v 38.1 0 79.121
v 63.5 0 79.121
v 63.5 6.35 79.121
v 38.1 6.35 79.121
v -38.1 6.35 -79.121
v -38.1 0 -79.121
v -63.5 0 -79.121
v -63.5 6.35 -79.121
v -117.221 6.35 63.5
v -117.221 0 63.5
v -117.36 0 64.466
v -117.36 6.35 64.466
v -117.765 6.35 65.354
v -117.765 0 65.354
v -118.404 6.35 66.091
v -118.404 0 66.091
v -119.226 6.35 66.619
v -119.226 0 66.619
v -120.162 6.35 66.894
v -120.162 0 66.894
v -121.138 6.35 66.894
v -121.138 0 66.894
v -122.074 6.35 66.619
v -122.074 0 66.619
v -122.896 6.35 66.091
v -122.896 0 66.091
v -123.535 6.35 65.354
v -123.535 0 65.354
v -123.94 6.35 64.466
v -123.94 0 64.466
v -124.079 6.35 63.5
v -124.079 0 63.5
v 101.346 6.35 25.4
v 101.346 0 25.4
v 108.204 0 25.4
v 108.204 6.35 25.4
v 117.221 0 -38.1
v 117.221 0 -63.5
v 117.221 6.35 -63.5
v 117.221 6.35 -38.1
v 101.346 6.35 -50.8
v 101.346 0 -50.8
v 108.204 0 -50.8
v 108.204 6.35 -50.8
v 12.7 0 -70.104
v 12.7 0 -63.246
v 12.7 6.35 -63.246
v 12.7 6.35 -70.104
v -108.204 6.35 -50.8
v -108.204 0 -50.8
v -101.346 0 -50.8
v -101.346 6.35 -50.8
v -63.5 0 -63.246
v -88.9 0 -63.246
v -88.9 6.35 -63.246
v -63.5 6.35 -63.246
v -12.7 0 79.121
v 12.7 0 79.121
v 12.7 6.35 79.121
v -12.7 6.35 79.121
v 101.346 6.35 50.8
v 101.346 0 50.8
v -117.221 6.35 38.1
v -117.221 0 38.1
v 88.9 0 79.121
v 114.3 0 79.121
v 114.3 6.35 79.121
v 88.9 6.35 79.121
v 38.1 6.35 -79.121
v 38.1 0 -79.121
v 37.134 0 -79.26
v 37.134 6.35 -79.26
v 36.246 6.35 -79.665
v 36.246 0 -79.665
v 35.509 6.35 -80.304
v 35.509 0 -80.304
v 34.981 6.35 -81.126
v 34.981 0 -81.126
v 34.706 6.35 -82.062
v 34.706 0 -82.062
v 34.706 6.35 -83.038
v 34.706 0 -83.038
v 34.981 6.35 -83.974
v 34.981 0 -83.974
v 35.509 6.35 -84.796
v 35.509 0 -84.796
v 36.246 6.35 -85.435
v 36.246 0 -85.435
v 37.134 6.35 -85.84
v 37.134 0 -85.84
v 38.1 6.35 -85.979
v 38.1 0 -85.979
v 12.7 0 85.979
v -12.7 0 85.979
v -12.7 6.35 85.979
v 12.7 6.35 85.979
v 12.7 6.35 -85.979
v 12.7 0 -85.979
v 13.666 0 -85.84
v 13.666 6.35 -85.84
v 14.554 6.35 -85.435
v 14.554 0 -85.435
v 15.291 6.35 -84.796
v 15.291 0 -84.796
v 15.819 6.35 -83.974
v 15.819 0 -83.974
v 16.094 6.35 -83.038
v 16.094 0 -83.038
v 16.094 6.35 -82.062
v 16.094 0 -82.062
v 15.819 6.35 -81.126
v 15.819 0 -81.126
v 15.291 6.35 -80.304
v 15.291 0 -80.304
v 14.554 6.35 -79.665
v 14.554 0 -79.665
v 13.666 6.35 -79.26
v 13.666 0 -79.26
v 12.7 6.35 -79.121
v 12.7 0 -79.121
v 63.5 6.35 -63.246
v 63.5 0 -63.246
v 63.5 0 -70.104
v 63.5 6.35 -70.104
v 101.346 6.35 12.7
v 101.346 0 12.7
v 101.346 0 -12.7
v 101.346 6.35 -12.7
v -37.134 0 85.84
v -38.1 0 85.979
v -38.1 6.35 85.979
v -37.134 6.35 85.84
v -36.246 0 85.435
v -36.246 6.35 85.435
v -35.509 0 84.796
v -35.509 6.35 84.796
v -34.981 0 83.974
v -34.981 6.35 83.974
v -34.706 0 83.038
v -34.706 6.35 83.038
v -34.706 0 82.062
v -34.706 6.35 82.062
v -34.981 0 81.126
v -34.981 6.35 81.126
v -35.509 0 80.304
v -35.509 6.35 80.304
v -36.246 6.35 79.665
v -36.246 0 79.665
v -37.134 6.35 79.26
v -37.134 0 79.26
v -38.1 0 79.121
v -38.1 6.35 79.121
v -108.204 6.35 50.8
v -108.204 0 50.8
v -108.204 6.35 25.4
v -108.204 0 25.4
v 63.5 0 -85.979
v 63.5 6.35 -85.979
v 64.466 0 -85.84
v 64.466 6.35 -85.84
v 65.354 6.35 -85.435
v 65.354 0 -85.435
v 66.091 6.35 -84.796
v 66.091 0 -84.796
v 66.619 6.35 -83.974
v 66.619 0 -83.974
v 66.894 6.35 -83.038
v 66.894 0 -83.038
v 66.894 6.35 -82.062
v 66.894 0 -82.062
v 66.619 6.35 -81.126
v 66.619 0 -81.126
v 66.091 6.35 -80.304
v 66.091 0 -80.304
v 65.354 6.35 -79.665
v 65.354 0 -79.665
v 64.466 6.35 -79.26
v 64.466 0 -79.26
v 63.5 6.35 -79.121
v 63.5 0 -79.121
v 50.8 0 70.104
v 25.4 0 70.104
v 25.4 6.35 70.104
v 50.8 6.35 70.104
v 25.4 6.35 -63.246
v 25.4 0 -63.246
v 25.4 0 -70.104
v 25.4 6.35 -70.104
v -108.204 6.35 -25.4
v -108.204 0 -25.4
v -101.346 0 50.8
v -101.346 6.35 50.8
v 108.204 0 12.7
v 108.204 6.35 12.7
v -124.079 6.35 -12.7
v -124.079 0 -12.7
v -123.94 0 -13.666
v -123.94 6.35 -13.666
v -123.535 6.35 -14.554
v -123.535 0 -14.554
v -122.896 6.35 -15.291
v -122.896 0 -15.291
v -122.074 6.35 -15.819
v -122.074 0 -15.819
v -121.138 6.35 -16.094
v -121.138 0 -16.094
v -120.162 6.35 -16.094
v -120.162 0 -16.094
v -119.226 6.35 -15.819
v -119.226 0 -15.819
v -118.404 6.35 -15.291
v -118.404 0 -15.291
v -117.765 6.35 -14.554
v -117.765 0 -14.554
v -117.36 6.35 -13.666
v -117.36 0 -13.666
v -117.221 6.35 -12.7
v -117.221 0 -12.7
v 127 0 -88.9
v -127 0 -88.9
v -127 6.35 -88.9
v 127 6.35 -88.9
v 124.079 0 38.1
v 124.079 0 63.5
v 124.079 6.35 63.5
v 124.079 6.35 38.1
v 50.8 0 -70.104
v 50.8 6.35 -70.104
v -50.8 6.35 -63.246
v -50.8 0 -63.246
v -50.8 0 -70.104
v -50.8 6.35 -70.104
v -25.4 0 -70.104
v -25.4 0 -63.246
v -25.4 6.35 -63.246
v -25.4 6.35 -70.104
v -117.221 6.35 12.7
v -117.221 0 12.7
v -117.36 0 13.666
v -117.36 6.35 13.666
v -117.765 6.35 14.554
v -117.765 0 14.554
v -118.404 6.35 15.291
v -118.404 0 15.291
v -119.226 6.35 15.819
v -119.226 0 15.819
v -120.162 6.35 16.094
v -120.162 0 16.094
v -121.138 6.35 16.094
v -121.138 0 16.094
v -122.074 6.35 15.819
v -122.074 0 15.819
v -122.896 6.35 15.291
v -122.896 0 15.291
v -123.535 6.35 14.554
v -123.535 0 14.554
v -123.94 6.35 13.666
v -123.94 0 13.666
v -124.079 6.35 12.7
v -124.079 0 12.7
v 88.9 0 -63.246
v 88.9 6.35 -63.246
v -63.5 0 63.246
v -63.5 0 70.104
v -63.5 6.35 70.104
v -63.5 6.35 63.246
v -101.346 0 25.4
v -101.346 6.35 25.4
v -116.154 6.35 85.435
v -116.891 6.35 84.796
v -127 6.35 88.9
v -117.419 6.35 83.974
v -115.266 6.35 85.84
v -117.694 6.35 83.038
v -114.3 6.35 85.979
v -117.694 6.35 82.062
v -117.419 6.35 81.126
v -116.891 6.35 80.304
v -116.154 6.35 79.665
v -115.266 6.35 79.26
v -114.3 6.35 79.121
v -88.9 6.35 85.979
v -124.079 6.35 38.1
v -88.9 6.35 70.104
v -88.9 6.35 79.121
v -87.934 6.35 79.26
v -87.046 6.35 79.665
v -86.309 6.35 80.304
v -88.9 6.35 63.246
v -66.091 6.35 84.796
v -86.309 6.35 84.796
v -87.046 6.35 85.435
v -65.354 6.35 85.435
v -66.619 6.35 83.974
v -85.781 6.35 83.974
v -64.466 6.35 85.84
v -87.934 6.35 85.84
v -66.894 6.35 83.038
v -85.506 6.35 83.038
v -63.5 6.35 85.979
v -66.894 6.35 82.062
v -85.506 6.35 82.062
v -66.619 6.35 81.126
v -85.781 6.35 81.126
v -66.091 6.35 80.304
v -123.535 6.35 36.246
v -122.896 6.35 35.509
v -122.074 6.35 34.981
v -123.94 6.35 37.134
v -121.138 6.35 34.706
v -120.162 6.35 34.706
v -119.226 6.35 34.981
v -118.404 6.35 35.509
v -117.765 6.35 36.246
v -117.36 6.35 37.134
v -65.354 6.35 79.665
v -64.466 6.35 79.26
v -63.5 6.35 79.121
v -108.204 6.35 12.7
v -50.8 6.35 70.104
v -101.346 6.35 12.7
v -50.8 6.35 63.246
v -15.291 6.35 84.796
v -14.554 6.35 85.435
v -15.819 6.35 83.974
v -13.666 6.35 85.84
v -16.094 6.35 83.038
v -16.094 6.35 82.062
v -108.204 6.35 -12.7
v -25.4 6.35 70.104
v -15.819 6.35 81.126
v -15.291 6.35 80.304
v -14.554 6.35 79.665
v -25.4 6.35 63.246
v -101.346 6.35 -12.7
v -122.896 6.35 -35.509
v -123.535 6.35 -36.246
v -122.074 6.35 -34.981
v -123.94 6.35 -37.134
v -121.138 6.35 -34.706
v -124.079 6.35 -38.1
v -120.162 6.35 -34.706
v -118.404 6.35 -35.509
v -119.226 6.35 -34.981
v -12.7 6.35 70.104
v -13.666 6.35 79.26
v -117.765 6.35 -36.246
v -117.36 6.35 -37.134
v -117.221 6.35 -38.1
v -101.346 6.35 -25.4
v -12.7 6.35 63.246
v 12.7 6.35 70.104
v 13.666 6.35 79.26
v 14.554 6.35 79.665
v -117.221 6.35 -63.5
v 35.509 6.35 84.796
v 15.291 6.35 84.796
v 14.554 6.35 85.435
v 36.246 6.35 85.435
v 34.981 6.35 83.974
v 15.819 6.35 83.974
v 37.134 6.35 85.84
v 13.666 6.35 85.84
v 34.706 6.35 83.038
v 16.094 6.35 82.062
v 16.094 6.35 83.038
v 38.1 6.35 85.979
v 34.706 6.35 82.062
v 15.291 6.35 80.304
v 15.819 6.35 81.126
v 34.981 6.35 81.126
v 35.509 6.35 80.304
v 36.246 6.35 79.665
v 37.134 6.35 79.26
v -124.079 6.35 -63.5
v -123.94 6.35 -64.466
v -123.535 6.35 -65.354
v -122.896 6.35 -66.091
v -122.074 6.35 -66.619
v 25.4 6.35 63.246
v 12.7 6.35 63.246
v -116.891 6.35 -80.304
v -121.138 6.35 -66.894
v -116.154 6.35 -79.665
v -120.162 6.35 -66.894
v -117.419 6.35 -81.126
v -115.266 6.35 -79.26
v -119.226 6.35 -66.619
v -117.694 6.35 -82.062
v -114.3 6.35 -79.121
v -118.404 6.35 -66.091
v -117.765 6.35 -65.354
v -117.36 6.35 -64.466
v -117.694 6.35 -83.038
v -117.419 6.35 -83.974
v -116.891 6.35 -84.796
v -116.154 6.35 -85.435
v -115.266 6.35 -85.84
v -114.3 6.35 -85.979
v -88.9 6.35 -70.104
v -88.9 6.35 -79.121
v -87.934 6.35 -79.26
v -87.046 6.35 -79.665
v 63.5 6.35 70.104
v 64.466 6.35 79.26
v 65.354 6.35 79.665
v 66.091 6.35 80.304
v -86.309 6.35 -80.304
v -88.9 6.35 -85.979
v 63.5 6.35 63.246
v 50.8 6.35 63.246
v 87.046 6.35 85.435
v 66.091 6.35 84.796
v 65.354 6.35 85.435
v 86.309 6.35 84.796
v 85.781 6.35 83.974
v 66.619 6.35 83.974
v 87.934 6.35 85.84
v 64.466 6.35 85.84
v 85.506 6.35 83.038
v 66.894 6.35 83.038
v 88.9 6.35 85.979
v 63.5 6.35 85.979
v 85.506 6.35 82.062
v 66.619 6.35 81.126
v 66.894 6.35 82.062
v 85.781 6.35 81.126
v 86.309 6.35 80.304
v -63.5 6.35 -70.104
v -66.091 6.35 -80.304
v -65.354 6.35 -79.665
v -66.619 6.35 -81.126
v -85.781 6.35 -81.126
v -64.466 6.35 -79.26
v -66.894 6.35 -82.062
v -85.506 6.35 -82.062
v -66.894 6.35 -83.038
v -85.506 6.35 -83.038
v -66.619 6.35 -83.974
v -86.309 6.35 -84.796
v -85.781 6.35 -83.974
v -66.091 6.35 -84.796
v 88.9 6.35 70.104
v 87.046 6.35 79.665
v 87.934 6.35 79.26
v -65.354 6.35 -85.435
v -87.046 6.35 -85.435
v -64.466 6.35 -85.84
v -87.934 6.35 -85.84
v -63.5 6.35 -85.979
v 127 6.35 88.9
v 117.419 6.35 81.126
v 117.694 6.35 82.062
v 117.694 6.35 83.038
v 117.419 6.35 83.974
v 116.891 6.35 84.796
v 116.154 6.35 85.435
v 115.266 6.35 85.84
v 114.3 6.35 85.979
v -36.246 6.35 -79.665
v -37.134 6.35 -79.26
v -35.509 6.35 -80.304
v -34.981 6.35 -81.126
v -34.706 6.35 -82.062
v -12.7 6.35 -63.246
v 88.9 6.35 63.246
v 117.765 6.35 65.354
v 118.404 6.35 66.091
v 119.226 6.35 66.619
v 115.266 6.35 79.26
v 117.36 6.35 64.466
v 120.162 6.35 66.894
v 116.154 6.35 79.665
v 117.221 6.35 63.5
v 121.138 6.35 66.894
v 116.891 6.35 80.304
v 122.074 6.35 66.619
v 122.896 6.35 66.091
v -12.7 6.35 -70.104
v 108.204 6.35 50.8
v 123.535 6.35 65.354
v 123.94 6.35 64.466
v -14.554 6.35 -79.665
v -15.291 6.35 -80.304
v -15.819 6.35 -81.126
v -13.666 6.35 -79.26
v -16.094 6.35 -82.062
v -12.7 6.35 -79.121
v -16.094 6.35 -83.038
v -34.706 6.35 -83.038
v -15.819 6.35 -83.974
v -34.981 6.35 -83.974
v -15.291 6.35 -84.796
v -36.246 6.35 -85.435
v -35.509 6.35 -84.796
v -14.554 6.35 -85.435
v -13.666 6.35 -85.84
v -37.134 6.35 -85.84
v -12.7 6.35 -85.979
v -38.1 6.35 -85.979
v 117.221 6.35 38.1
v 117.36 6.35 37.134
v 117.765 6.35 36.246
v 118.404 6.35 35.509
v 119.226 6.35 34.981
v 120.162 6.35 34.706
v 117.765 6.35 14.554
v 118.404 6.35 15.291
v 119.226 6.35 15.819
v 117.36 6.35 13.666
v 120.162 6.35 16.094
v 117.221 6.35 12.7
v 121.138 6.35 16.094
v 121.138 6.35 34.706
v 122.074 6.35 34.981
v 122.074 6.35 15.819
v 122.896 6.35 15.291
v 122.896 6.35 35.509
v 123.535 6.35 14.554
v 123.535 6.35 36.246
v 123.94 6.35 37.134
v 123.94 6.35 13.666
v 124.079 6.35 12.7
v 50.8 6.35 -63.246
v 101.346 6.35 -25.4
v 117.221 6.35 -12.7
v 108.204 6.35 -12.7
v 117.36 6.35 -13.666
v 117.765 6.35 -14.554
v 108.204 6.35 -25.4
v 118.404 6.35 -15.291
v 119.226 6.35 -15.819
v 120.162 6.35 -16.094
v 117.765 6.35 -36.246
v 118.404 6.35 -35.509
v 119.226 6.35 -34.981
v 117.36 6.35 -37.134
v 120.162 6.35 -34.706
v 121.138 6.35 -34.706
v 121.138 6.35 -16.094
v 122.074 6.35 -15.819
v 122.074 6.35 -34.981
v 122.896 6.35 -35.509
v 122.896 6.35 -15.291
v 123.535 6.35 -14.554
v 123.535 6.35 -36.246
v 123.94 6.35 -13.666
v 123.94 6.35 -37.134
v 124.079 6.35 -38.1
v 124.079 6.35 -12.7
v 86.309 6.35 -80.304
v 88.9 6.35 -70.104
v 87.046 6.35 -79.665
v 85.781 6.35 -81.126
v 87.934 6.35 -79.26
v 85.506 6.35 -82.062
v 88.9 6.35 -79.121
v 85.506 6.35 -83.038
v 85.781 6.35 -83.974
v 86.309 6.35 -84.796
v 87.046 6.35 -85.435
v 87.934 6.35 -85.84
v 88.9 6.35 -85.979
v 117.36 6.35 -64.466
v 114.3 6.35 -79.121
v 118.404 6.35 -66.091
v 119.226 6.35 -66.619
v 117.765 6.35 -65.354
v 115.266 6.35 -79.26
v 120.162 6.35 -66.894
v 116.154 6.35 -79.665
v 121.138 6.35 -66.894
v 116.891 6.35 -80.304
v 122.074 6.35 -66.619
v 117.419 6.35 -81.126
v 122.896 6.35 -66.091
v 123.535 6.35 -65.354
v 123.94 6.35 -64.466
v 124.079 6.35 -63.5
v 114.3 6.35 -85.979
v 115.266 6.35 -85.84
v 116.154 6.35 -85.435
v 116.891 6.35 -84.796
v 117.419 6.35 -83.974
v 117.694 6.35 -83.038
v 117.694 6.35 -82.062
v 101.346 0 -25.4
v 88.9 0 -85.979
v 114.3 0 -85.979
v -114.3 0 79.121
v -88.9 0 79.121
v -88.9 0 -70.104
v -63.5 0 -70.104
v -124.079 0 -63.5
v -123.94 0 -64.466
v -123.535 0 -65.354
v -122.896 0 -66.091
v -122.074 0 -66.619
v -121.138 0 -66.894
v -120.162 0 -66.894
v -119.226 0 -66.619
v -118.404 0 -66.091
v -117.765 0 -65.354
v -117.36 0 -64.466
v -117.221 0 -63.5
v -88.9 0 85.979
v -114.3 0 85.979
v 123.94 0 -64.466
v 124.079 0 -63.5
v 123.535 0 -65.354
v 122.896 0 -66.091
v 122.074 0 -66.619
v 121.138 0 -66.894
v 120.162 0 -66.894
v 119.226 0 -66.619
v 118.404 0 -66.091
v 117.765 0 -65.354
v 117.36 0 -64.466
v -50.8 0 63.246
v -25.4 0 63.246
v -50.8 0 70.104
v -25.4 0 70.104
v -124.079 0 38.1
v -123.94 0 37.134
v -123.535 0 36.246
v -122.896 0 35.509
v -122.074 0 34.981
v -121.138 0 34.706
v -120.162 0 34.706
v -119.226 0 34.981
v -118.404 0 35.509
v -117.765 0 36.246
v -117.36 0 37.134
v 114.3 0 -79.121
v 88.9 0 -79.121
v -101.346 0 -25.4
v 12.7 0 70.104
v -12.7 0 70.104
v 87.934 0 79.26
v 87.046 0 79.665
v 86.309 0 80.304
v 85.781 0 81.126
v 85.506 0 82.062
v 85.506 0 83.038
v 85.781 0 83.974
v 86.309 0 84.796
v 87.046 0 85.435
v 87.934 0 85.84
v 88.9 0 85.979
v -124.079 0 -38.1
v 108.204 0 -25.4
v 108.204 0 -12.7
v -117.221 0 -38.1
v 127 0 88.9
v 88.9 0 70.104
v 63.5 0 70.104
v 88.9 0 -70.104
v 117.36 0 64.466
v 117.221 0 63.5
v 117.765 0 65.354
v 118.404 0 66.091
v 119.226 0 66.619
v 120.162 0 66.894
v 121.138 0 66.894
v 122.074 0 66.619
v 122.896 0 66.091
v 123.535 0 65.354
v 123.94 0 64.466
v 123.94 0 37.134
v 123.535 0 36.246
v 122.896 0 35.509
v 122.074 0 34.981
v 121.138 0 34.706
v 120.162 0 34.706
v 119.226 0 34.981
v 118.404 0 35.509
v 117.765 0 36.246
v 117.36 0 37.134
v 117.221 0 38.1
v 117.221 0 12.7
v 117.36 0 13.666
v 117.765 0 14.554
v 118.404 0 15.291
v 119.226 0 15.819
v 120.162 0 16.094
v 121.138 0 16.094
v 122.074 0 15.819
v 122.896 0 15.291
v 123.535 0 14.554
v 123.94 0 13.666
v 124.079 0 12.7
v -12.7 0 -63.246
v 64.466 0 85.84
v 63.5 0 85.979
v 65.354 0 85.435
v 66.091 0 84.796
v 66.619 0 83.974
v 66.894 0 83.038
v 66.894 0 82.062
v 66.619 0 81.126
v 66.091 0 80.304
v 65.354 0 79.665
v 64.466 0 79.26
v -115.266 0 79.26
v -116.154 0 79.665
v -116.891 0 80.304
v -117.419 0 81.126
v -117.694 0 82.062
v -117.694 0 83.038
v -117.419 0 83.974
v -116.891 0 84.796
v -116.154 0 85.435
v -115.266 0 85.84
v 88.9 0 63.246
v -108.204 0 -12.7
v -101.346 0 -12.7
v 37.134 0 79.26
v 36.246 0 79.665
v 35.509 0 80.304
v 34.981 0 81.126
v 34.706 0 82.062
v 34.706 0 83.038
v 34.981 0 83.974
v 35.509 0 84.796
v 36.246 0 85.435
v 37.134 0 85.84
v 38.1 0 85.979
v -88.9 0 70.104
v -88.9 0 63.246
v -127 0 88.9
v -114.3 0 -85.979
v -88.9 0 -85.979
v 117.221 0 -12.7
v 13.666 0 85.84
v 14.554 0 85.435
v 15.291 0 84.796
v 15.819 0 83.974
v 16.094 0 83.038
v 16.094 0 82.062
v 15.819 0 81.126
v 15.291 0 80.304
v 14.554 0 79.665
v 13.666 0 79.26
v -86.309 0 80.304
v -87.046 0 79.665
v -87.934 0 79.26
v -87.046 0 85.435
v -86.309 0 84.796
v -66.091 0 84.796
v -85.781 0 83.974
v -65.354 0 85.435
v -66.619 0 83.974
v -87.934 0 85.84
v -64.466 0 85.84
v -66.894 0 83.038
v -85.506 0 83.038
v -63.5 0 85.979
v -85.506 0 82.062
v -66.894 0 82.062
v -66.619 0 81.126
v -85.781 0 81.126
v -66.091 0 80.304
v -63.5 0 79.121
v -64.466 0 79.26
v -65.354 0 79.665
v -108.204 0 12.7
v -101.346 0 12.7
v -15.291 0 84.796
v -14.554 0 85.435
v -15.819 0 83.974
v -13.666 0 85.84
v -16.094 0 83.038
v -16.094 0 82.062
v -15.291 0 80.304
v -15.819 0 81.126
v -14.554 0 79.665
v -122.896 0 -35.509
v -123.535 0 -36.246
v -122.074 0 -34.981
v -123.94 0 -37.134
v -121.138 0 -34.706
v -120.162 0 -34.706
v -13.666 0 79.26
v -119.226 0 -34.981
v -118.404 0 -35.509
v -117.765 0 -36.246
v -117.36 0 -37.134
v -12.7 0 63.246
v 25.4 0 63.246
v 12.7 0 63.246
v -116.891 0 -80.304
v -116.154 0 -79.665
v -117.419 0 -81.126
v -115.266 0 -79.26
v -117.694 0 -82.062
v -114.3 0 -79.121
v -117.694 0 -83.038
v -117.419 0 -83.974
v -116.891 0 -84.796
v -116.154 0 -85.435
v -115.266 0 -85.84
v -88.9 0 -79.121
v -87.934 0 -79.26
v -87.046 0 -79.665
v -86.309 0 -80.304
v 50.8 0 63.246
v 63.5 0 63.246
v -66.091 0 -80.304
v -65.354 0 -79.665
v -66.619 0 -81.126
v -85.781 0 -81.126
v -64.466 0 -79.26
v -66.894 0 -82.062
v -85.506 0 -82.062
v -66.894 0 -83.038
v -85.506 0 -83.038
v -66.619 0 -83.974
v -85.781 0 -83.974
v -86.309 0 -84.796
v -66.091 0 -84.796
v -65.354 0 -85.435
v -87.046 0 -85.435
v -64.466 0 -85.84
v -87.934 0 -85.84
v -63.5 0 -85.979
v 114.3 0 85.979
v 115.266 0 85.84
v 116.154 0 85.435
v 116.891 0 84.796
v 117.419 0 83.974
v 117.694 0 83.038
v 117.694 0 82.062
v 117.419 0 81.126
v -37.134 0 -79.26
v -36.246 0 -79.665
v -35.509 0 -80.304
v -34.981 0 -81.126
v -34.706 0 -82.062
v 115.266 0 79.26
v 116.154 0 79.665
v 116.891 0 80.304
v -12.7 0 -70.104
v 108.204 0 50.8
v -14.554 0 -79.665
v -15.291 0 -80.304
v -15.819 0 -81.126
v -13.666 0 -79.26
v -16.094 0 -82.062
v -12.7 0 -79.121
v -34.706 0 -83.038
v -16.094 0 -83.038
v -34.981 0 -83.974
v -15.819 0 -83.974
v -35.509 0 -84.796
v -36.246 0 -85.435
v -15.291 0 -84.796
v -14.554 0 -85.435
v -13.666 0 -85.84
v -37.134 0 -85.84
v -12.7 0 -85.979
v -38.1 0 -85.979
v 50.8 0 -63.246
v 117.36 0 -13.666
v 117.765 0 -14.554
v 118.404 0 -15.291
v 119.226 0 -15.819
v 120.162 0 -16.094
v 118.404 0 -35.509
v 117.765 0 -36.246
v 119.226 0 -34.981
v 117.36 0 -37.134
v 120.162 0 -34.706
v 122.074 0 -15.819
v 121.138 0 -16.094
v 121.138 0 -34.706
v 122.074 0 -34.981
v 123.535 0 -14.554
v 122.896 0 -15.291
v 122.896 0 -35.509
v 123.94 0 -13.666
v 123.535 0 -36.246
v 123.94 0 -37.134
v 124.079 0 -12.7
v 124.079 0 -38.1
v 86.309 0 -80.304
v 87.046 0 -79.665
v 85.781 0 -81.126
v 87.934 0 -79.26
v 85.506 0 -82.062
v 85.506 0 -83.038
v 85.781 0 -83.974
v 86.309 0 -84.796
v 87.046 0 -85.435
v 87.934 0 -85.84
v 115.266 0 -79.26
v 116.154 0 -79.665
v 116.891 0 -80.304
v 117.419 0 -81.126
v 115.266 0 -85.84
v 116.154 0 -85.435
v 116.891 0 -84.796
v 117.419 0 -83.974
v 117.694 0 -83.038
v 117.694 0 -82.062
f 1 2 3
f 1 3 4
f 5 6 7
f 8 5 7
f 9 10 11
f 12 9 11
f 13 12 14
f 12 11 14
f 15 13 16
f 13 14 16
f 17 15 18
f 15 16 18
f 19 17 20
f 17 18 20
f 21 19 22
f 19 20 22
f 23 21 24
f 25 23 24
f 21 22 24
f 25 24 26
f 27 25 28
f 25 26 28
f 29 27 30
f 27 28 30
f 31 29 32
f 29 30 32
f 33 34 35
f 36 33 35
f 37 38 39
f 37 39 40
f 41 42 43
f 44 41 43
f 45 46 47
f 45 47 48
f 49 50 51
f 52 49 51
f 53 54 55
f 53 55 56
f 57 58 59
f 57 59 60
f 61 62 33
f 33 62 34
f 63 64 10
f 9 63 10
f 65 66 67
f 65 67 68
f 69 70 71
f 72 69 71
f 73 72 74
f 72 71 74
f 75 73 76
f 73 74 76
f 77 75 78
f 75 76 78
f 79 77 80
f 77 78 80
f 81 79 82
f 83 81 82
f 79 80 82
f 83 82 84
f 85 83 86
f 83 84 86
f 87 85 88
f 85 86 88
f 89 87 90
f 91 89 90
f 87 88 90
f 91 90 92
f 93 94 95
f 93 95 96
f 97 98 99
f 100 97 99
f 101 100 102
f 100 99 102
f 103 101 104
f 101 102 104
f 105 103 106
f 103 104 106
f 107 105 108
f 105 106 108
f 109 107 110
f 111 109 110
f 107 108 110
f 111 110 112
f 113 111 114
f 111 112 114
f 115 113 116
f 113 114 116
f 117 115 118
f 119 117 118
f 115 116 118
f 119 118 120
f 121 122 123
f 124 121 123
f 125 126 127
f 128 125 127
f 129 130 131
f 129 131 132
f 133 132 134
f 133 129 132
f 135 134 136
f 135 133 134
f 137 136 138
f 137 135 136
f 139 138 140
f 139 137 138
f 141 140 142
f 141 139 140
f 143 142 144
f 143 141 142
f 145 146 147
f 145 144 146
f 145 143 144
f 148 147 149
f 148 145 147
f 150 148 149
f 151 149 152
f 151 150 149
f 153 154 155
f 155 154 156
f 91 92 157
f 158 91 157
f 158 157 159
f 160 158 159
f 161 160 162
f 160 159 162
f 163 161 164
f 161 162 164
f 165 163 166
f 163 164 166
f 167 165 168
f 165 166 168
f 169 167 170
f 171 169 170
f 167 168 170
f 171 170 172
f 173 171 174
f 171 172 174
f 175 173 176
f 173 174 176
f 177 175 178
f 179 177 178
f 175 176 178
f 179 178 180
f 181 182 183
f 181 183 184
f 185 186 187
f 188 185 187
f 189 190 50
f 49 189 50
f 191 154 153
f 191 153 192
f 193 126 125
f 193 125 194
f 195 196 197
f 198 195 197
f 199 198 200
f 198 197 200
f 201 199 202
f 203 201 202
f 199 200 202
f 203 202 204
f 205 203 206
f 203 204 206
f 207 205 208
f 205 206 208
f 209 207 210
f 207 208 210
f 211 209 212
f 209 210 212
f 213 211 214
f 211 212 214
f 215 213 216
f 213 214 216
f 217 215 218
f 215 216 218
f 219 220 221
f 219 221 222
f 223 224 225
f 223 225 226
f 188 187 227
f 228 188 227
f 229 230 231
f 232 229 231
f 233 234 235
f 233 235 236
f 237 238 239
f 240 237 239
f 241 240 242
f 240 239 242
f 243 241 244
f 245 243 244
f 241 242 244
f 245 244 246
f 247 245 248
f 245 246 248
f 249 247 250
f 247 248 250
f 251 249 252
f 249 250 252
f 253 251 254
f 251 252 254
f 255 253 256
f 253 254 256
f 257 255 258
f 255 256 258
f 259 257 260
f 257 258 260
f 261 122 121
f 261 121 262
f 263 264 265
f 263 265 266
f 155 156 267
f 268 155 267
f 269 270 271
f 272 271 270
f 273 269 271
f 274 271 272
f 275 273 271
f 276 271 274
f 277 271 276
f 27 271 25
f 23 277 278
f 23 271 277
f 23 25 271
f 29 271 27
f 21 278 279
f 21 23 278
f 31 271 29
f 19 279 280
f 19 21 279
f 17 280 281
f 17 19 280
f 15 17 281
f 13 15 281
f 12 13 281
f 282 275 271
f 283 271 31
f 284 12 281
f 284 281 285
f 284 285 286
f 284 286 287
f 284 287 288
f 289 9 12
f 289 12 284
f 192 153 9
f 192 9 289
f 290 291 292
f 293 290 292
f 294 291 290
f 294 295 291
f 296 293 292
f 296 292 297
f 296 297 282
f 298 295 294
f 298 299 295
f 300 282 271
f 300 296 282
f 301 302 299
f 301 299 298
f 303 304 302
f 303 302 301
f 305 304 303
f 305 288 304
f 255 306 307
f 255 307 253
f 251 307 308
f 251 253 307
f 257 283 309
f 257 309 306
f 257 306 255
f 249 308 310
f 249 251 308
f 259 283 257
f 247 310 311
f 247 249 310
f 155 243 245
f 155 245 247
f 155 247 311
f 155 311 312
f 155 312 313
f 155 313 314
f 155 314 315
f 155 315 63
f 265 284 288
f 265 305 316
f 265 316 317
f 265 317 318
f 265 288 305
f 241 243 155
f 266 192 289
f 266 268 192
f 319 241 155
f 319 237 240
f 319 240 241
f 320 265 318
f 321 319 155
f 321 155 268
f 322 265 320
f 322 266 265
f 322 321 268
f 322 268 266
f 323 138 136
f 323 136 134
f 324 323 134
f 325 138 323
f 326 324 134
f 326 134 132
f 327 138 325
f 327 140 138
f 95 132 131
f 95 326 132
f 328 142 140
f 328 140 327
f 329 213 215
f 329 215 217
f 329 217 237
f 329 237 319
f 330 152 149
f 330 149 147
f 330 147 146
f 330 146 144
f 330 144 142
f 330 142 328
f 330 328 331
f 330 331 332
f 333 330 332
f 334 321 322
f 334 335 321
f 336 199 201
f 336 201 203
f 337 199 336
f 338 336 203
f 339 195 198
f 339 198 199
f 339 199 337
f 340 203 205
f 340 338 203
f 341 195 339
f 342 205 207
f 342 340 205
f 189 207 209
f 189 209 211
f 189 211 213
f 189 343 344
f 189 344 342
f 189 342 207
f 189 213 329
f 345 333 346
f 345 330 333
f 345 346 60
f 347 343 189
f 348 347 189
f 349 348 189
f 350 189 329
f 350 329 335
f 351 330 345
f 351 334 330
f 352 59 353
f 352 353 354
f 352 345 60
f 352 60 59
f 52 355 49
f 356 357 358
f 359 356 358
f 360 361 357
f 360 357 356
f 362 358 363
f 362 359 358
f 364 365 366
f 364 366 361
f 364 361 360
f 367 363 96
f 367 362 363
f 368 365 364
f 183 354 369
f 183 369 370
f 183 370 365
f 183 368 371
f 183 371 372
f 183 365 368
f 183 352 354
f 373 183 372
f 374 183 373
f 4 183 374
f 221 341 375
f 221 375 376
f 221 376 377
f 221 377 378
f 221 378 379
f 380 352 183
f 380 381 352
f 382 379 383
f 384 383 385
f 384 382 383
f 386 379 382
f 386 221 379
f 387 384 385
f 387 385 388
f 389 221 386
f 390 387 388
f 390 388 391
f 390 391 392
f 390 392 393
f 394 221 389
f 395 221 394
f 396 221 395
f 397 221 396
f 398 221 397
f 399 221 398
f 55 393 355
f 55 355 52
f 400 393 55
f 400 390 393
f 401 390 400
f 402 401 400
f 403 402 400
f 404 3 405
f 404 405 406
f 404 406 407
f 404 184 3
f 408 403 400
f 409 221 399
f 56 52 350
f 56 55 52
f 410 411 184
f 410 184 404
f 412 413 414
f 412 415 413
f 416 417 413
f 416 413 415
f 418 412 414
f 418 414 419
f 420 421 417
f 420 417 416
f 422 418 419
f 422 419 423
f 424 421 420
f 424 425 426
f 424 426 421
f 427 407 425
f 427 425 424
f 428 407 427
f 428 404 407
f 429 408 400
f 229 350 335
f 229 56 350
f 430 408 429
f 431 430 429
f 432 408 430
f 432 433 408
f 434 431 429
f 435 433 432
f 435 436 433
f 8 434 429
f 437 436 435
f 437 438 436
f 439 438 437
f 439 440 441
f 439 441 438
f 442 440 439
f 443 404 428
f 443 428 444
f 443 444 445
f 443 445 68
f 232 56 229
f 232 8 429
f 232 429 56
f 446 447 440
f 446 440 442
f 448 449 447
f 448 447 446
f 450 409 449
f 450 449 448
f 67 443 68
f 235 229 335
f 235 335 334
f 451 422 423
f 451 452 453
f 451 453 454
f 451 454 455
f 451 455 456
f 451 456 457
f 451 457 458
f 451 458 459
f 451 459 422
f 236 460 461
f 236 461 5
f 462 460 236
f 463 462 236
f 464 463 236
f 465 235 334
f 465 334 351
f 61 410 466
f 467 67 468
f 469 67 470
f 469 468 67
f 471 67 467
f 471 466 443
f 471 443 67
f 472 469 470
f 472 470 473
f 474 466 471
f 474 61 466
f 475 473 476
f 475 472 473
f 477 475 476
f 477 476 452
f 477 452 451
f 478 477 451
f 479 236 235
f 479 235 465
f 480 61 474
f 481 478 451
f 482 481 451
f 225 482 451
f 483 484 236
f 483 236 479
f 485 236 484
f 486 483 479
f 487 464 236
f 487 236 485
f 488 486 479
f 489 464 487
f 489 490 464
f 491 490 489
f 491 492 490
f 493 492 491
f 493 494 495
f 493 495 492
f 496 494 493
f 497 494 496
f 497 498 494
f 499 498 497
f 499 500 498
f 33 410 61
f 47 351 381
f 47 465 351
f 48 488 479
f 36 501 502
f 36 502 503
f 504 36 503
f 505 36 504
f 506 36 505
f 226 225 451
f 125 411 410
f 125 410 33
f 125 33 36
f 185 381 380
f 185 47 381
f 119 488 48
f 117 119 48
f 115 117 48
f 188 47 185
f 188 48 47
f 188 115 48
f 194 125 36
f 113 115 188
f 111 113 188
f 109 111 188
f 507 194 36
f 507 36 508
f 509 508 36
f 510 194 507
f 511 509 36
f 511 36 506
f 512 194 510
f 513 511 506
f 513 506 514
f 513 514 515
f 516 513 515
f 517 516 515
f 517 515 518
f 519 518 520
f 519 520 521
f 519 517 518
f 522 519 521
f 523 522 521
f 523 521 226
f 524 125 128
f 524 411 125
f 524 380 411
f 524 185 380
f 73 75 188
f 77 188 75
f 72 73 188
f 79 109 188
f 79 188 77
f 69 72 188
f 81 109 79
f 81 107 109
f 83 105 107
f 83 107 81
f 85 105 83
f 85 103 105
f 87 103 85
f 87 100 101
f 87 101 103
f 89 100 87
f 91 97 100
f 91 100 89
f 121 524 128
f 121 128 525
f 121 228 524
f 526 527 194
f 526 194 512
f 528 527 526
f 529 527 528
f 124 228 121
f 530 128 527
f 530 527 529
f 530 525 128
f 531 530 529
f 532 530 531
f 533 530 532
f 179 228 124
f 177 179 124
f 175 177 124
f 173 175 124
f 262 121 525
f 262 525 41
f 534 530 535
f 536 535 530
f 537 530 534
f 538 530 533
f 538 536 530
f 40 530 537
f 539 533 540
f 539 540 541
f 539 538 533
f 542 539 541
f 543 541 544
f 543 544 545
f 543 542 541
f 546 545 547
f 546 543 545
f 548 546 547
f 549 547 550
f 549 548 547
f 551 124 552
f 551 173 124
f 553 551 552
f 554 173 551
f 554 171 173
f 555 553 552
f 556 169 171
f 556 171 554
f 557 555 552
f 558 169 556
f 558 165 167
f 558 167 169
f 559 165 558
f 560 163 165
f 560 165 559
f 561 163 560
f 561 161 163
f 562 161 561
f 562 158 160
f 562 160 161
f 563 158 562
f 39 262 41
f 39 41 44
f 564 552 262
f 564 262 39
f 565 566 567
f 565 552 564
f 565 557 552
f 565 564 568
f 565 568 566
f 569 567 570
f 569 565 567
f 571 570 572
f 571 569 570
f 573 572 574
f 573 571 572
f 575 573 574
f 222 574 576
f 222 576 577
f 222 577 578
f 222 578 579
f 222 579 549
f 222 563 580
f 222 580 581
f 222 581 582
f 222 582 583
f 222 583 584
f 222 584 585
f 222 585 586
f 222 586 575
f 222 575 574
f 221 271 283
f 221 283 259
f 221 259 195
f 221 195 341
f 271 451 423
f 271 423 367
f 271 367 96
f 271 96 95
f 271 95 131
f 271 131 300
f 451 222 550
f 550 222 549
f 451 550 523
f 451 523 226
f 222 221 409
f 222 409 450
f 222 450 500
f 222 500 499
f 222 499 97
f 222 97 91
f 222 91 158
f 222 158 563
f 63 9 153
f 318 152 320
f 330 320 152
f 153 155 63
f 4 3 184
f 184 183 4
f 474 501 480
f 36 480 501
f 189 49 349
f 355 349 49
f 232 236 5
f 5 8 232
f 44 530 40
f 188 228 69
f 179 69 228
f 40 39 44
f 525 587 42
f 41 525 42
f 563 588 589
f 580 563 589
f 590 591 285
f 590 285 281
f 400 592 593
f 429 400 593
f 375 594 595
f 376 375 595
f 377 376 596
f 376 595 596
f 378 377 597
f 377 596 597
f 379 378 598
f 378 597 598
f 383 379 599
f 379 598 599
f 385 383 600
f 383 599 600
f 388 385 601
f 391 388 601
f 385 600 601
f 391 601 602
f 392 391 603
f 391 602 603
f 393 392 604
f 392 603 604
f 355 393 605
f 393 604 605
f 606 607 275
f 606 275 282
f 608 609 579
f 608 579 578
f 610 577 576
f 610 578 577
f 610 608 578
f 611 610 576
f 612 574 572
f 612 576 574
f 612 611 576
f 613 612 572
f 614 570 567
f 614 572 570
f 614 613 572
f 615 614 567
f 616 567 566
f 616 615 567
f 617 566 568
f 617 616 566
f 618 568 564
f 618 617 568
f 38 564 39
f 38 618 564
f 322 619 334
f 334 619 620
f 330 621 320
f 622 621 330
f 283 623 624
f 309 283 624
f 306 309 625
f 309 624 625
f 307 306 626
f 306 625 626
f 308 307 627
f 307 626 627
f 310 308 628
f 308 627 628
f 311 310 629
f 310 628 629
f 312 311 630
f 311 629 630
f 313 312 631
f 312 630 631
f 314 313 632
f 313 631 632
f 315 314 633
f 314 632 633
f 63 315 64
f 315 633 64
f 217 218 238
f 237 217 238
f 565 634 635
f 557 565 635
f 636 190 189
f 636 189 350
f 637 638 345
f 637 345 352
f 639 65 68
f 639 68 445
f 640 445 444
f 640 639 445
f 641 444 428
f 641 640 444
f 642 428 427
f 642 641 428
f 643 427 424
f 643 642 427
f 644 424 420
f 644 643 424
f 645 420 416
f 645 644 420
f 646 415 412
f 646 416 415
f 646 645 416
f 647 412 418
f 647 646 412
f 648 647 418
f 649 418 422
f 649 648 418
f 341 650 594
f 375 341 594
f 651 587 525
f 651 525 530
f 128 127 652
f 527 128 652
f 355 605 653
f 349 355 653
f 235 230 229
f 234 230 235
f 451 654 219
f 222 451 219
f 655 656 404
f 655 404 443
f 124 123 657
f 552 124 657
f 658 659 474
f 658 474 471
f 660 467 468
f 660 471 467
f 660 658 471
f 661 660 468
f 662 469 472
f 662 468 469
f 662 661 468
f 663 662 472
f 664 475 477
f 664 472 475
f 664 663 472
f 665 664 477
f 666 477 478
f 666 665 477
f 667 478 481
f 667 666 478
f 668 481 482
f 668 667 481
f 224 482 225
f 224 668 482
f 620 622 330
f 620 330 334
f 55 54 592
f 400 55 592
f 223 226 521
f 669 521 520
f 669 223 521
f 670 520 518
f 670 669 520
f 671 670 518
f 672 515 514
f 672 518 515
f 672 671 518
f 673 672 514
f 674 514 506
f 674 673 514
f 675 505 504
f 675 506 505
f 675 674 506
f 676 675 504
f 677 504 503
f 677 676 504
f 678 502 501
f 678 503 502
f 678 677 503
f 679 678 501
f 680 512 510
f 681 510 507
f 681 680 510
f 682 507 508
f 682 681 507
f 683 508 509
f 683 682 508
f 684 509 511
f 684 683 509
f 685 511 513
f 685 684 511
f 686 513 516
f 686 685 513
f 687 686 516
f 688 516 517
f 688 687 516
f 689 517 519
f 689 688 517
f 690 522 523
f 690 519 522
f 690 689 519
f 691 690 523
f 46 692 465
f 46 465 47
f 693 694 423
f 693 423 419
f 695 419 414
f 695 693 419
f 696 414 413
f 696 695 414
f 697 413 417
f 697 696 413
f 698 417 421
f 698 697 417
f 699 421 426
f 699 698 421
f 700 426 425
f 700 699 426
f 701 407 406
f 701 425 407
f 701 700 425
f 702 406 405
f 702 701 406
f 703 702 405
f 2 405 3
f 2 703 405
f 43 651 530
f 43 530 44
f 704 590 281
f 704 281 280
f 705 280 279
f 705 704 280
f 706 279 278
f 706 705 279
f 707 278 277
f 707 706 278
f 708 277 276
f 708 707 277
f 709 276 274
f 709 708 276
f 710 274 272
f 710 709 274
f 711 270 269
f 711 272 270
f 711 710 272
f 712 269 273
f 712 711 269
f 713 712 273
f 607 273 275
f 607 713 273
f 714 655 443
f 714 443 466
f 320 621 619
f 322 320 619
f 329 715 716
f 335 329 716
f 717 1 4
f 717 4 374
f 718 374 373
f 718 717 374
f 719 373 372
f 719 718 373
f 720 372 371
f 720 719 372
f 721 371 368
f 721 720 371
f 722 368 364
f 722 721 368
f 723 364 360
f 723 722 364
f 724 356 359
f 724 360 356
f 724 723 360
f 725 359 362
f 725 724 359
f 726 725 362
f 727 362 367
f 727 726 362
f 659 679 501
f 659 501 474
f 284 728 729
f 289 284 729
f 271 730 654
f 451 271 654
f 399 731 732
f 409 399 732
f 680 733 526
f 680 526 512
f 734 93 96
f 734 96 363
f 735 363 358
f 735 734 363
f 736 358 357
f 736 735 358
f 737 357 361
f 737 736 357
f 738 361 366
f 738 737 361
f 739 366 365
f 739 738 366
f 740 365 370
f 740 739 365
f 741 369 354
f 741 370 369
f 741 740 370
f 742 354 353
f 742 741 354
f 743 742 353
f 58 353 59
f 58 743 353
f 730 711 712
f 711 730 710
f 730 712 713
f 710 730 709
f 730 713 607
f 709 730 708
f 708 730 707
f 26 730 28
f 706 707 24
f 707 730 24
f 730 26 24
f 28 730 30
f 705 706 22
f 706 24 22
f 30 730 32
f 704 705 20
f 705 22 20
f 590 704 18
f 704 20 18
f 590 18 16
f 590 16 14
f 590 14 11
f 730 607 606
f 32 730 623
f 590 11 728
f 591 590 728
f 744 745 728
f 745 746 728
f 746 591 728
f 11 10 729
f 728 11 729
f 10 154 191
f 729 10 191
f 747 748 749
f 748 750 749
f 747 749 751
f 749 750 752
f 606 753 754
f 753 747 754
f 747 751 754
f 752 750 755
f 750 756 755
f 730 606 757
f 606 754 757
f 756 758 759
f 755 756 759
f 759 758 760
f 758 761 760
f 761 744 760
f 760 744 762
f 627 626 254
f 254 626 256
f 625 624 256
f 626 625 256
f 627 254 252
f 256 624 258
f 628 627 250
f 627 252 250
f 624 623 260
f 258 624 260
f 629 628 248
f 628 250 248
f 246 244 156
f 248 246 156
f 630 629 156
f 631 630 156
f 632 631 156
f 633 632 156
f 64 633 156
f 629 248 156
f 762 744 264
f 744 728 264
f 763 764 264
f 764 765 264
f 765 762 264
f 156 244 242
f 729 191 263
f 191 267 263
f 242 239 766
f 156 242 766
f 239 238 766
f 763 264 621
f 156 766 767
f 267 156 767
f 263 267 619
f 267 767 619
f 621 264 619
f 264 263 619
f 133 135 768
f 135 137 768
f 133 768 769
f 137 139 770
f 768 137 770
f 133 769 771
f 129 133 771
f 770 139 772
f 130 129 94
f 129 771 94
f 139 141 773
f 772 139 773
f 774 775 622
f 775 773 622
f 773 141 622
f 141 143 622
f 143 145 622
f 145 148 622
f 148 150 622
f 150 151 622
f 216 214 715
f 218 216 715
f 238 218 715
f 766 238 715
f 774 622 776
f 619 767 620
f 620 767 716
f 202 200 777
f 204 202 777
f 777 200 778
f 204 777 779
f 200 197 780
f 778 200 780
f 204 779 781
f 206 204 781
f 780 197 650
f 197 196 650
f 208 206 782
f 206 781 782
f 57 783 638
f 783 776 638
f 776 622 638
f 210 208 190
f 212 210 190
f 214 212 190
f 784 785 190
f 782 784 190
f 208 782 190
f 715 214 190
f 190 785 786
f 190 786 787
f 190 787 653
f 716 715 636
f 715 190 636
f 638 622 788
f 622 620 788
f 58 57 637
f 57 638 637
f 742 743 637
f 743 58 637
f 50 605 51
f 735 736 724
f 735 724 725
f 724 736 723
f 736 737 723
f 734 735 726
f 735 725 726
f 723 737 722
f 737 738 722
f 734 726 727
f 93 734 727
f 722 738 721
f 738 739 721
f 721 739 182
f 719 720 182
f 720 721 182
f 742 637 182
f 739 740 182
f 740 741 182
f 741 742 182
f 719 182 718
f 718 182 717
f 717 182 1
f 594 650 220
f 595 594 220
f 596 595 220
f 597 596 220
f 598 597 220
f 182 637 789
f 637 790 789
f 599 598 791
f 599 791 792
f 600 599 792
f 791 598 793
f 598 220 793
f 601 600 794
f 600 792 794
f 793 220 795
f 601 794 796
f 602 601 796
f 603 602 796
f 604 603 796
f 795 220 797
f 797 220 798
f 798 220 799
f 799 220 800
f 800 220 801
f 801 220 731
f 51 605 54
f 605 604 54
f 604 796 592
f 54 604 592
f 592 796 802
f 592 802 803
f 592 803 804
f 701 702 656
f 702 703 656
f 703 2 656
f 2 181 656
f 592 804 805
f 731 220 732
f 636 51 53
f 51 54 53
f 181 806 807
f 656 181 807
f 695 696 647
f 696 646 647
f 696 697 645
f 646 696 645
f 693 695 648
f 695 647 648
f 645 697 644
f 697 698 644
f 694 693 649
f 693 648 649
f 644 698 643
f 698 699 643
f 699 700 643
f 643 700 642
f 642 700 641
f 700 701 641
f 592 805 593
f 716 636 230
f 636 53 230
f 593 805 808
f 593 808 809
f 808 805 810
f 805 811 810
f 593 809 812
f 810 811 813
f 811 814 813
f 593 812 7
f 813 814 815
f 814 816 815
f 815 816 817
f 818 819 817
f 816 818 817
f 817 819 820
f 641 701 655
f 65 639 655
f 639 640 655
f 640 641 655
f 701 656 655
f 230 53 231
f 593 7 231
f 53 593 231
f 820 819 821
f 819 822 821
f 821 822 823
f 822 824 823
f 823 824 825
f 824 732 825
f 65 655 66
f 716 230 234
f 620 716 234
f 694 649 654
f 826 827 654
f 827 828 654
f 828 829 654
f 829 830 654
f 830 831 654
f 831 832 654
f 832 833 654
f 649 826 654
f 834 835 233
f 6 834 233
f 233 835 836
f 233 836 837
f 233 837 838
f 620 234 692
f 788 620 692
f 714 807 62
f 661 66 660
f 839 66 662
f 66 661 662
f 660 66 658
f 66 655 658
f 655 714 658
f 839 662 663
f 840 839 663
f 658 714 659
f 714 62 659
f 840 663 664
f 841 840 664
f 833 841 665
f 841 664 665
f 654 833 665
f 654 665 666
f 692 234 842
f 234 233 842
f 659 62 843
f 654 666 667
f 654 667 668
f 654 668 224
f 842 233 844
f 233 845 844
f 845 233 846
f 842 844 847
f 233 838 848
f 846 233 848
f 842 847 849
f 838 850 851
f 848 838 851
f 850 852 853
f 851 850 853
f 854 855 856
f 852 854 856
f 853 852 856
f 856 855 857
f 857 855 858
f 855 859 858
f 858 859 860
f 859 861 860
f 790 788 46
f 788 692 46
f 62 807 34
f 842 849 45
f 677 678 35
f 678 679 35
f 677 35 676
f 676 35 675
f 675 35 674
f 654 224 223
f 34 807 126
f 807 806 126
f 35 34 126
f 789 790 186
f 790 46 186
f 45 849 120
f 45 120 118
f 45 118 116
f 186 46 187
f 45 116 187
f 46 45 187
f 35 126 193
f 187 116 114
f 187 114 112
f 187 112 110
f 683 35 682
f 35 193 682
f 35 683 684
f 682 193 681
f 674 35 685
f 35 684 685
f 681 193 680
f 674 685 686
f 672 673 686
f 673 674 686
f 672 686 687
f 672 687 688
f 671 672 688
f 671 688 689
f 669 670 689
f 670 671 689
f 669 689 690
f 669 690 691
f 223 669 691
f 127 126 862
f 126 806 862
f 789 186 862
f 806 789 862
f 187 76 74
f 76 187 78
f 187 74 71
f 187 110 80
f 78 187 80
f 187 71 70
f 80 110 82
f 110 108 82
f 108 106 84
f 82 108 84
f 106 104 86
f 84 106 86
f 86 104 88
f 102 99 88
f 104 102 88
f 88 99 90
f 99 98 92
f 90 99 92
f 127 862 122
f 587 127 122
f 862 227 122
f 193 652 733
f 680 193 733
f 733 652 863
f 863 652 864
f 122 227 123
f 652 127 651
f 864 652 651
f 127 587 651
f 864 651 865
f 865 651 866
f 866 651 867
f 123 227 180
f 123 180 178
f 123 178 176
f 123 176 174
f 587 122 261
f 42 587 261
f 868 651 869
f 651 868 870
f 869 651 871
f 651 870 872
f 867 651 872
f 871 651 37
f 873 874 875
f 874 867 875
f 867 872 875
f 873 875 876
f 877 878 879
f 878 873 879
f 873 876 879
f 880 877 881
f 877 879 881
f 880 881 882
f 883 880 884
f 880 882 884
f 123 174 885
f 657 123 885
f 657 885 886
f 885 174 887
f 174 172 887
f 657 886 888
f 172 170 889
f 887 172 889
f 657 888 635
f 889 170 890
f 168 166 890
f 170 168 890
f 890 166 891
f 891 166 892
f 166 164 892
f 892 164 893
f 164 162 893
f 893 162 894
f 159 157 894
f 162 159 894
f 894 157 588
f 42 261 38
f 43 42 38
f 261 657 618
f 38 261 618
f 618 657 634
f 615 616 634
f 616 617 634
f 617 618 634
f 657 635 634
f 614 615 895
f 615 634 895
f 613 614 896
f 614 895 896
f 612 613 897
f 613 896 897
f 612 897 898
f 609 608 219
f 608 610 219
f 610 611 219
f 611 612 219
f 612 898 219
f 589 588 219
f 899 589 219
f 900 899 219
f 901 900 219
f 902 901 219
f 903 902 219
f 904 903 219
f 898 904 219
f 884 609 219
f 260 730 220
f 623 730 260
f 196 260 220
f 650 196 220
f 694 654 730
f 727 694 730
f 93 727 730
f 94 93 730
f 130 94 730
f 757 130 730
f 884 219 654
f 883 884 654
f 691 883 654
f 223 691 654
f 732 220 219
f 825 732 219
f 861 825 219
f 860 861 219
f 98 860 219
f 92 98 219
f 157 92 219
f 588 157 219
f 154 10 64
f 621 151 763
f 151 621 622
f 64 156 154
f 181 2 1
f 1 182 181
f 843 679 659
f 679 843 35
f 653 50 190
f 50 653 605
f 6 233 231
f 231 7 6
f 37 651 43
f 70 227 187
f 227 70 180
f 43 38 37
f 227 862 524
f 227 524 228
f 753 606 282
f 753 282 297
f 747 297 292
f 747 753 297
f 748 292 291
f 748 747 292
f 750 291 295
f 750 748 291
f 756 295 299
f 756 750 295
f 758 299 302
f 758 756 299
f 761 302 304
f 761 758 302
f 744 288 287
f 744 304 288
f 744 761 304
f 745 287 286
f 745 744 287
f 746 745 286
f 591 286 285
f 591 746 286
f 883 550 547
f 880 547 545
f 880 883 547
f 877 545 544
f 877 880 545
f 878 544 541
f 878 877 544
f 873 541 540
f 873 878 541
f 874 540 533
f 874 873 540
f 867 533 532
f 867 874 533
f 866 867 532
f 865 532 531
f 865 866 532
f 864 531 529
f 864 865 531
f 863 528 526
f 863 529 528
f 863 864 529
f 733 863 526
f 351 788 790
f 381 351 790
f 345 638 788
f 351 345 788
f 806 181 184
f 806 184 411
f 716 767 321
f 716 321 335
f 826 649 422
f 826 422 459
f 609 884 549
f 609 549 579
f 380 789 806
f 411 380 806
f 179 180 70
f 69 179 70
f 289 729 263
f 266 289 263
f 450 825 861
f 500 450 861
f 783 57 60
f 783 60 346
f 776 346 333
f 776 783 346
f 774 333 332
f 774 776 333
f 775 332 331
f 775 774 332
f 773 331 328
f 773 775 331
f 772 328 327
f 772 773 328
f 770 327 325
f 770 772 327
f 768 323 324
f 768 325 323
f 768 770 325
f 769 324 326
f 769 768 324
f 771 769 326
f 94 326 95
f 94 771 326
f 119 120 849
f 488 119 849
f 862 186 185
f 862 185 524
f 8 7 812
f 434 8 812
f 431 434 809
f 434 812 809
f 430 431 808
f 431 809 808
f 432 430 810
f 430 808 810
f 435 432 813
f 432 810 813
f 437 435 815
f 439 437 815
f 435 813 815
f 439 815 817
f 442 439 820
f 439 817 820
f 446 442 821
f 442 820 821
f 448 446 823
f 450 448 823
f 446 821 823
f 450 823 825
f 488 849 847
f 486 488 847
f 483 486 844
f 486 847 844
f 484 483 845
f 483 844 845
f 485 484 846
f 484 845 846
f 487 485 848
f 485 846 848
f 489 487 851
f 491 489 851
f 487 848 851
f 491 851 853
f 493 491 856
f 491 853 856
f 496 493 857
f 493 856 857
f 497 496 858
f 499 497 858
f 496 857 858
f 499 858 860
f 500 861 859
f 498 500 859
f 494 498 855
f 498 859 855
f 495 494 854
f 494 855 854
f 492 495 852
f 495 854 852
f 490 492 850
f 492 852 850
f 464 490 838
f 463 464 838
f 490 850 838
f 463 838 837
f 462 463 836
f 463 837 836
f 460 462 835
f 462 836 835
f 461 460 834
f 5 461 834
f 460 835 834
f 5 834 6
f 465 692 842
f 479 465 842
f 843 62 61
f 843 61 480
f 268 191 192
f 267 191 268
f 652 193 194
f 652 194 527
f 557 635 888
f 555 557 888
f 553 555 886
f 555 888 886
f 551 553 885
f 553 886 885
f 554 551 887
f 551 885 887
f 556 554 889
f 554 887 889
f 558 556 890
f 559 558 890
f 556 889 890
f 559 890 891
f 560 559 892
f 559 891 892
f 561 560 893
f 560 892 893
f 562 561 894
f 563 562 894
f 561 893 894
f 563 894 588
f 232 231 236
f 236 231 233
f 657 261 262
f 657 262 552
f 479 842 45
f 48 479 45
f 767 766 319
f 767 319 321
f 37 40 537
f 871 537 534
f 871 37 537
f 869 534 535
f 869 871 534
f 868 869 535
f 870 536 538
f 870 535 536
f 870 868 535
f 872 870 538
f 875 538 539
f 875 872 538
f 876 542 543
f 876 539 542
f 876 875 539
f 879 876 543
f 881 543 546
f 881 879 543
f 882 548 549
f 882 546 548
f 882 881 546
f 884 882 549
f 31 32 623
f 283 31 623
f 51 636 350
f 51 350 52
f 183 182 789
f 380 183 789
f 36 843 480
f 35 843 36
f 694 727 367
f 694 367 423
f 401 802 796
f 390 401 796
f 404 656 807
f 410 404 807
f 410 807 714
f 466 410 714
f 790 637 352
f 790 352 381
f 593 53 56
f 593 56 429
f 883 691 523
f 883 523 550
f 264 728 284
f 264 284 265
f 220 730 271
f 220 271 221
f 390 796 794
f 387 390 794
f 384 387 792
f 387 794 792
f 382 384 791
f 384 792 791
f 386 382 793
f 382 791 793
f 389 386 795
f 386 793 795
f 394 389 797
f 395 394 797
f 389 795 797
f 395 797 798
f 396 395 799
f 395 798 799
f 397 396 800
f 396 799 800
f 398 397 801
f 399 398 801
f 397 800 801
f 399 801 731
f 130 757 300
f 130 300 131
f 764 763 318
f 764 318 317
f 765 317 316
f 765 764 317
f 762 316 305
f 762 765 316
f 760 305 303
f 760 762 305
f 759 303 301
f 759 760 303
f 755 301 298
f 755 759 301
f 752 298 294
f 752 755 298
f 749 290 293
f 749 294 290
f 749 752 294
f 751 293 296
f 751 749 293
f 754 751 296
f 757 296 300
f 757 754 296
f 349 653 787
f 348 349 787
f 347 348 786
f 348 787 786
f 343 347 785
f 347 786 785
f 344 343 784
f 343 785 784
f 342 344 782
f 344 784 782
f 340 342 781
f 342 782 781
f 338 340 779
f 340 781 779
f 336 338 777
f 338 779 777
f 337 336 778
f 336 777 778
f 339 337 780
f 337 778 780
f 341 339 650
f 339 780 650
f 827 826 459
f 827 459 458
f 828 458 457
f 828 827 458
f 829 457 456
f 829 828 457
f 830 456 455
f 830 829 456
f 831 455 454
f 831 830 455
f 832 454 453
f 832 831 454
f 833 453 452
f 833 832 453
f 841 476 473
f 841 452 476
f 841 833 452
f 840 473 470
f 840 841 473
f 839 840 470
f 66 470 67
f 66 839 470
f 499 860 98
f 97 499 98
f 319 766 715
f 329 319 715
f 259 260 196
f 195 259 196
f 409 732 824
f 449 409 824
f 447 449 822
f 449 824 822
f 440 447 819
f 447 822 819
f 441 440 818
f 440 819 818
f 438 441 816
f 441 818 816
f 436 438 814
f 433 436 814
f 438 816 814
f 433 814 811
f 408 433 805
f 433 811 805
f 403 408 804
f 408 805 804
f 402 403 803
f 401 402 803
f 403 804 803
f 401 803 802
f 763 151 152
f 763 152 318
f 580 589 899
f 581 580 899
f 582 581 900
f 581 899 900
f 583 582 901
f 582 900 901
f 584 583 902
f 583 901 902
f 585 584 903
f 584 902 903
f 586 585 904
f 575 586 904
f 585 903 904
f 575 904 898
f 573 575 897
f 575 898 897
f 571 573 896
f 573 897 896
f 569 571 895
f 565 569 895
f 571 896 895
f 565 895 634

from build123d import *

# Parameters (mm, degrees)
SKETCH1_W           = 254
SKETCH1_H           = 177.8
BOSS_EXTRUDE1_DEPTH = 6.35
SKETCH2_W           = 25.4
SKETCH2_H           = 6.858
SKETCH2_W_2         = 6.858
SKETCH2_H_2         = 25.4
CUT_EXTRUDE1_DEPTH  = 156.15325488


with BuildPart() as part:
    # Sketch1 → Boss-Extrude1 (new body)
    with BuildSketch(Plane(origin=(0, 0, 0), x_dir=(1, 0, 0), z_dir=(0, 1, 0))):
        Rectangle(SKETCH1_W, SKETCH1_H)
    extrude(amount=BOSS_EXTRUDE1_DEPTH)

    # Sketch2 → Cut-Extrude1 (cut, through all)
    with BuildSketch(Plane(origin=(0, 0, 0), x_dir=(1, 0, 0), z_dir=(0, 1, 0))):
        with Locations((76.2, 66.675)):
            Rectangle(SKETCH2_W, SKETCH2_H)
        with Locations((-76.2, 66.675)):
            Rectangle(SKETCH2_W, SKETCH2_H)
        with BuildLine():
            Line((38.1, 85.979), (63.5, 85.979))
            ThreePointArc((63.5, 85.979), (66.929, 82.55), (63.5, 79.121))
            Line((63.5, 79.121), (38.1, 79.121))
            ThreePointArc((38.1, 79.121), (34.671, 82.55), (38.1, 85.979))
        make_face()
        with BuildLine():
            Line((88.9, 85.979), (114.3, 85.979))
            ThreePointArc((114.3, 85.979), (117.729, 82.55), (114.3, 79.121))
            Line((114.3, 79.121), (88.9, 79.121))
            ThreePointArc((88.9, 79.121), (85.471, 82.55), (88.9, 85.979))
        make_face()
        with BuildLine():
            Line((-114.3, 85.979), (-88.9, 85.979))
            ThreePointArc((-88.9, 85.979), (-85.471, 82.55), (-88.9, 79.121))
            Line((-88.9, 79.121), (-114.3, 79.121))
            ThreePointArc((-114.3, 79.121), (-117.729, 82.55), (-114.3, 85.979))
        make_face()
        with Locations((38.1, 66.675)):
            Rectangle(SKETCH2_W, SKETCH2_H)
        with BuildLine():
            Line((-63.5, 85.979), (-38.1, 85.979))
            ThreePointArc((-38.1, 85.979), (-34.671, 82.55), (-38.1, 79.121))
            Line((-38.1, 79.121), (-63.5, 79.121))
            ThreePointArc((-63.5, 79.121), (-66.929, 82.55), (-63.5, 85.979))
        make_face()
        with BuildLine():
            Line((-12.7, 85.979), (12.7, 85.979))
            ThreePointArc((12.7, 85.979), (16.129, 82.55), (12.7, 79.121))
            Line((12.7, 79.121), (-12.7, 79.121))
            ThreePointArc((-12.7, 79.121), (-16.129, 82.55), (-12.7, 85.979))
        make_face()
        with Locations((-104.775, 38.1)):
            Rectangle(SKETCH2_W_2, SKETCH2_H_2)
        with Locations((-104.775, 0)):
            Rectangle(SKETCH2_W_2, SKETCH2_H_2)
        with Locations((0, 66.675)):
            Rectangle(SKETCH2_W, SKETCH2_H)
        with Locations((-38.1, 66.675)):
            Rectangle(SKETCH2_W, SKETCH2_H)
        with BuildLine():
            Line((-124.079, -12.7), (-124.079, 12.7))
            ThreePointArc((-124.079, 12.7), (-120.65, 16.129), (-117.221, 12.7))
            Line((-117.221, 12.7), (-117.221, -12.7))
            ThreePointArc((-117.221, -12.7), (-120.65, -16.129), (-124.079, -12.7))
        make_face()
        with Locations((-104.775, -38.1)):
            Rectangle(SKETCH2_W_2, SKETCH2_H_2)
        with BuildLine():
            Line((-124.079, 38.1), (-124.079, 63.5))
            ThreePointArc((-124.079, 63.5), (-120.65, 66.929), (-117.221, 63.5))
            Line((-117.221, 63.5), (-117.221, 38.1))
            ThreePointArc((-117.221, 38.1), (-120.65, 34.671), (-124.079, 38.1))
        make_face()
        with BuildLine():
            Line((-124.079, -63.5), (-124.079, -38.1))
            ThreePointArc((-124.079, -38.1), (-120.65, -34.671), (-117.221, -38.1))
            Line((-117.221, -38.1), (-117.221, -63.5))
            ThreePointArc((-117.221, -63.5), (-120.65, -66.929), (-124.079, -63.5))
        make_face()
        with BuildLine():
            Line((124.079, -12.7), (124.079, 12.7))
            ThreePointArc((124.079, 12.7), (120.65, 16.129), (117.221, 12.7))
            Line((117.221, 12.7), (117.221, -12.7))
            ThreePointArc((117.221, -12.7), (120.65, -16.129), (124.079, -12.7))
        make_face()
        with BuildLine():
            Line((124.079, 38.1), (124.079, 63.5))
            ThreePointArc((124.079, 63.5), (120.65, 66.929), (117.221, 63.5))
            Line((117.221, 63.5), (117.221, 38.1))
            ThreePointArc((117.221, 38.1), (120.65, 34.671), (124.079, 38.1))
        make_face()
        with BuildLine():
            Line((124.079, -63.5), (124.079, -38.1))
            ThreePointArc((124.079, -38.1), (120.65, -34.671), (117.221, -38.1))
            Line((117.221, -38.1), (117.221, -63.5))
            ThreePointArc((117.221, -63.5), (120.65, -66.929), (124.079, -63.5))
        make_face()
        with Locations((104.775, -38.1)):
            Rectangle(SKETCH2_W_2, SKETCH2_H_2)
        with Locations((104.775, 38.1)):
            Rectangle(SKETCH2_W_2, SKETCH2_H_2)
        with Locations((104.775, 0)):
            Rectangle(SKETCH2_W_2, SKETCH2_H_2)
        with Locations((-38.1, -66.675)):
            Rectangle(SKETCH2_W, SKETCH2_H)
        with Locations((38.1, -66.675)):
            Rectangle(SKETCH2_W, SKETCH2_H)
        with Locations((0, -66.675)):
            Rectangle(SKETCH2_W, SKETCH2_H)
        with BuildLine():
            Line((12.7, -79.121), (-12.7, -79.121))
            ThreePointArc((-12.7, -79.121), (-16.129, -82.55), (-12.7, -85.979))
            Line((-12.7, -85.979), (12.7, -85.979))
            ThreePointArc((12.7, -85.979), (16.129, -82.55), (12.7, -79.121))
        make_face()
        with BuildLine():
            Line((-38.1, -79.121), (-63.5, -79.121))
            ThreePointArc((-63.5, -79.121), (-66.929, -82.55), (-63.5, -85.979))
            Line((-63.5, -85.979), (-38.1, -85.979))
            ThreePointArc((-38.1, -85.979), (-34.671, -82.55), (-38.1, -79.121))
        make_face()
        with BuildLine():
            Line((-88.9, -79.121), (-114.3, -79.121))
            ThreePointArc((-114.3, -79.121), (-117.729, -82.55), (-114.3, -85.979))
            Line((-114.3, -85.979), (-88.9, -85.979))
            ThreePointArc((-88.9, -85.979), (-85.471, -82.55), (-88.9, -79.121))
        make_face()
        with BuildLine():
            Line((114.3, -79.121), (88.9, -79.121))
            ThreePointArc((88.9, -79.121), (85.471, -82.55), (88.9, -85.979))
            Line((88.9, -85.979), (114.3, -85.979))
            ThreePointArc((114.3, -85.979), (117.729, -82.55), (114.3, -79.121))
        make_face()
        with BuildLine():
            Line((63.5, -79.121), (38.1, -79.121))
            ThreePointArc((38.1, -79.121), (34.671, -82.55), (38.1, -85.979))
            Line((38.1, -85.979), (63.5, -85.979))
            ThreePointArc((63.5, -85.979), (66.929, -82.55), (63.5, -79.121))
        make_face()
        with Locations((-76.2, -66.675)):
            Rectangle(SKETCH2_W, SKETCH2_H)
        with Locations((76.2, -66.675)):
            Rectangle(SKETCH2_W, SKETCH2_H)
    extrude(amount=CUT_EXTRUDE1_DEPTH, mode=Mode.SUBTRACT)


solid = part.part
